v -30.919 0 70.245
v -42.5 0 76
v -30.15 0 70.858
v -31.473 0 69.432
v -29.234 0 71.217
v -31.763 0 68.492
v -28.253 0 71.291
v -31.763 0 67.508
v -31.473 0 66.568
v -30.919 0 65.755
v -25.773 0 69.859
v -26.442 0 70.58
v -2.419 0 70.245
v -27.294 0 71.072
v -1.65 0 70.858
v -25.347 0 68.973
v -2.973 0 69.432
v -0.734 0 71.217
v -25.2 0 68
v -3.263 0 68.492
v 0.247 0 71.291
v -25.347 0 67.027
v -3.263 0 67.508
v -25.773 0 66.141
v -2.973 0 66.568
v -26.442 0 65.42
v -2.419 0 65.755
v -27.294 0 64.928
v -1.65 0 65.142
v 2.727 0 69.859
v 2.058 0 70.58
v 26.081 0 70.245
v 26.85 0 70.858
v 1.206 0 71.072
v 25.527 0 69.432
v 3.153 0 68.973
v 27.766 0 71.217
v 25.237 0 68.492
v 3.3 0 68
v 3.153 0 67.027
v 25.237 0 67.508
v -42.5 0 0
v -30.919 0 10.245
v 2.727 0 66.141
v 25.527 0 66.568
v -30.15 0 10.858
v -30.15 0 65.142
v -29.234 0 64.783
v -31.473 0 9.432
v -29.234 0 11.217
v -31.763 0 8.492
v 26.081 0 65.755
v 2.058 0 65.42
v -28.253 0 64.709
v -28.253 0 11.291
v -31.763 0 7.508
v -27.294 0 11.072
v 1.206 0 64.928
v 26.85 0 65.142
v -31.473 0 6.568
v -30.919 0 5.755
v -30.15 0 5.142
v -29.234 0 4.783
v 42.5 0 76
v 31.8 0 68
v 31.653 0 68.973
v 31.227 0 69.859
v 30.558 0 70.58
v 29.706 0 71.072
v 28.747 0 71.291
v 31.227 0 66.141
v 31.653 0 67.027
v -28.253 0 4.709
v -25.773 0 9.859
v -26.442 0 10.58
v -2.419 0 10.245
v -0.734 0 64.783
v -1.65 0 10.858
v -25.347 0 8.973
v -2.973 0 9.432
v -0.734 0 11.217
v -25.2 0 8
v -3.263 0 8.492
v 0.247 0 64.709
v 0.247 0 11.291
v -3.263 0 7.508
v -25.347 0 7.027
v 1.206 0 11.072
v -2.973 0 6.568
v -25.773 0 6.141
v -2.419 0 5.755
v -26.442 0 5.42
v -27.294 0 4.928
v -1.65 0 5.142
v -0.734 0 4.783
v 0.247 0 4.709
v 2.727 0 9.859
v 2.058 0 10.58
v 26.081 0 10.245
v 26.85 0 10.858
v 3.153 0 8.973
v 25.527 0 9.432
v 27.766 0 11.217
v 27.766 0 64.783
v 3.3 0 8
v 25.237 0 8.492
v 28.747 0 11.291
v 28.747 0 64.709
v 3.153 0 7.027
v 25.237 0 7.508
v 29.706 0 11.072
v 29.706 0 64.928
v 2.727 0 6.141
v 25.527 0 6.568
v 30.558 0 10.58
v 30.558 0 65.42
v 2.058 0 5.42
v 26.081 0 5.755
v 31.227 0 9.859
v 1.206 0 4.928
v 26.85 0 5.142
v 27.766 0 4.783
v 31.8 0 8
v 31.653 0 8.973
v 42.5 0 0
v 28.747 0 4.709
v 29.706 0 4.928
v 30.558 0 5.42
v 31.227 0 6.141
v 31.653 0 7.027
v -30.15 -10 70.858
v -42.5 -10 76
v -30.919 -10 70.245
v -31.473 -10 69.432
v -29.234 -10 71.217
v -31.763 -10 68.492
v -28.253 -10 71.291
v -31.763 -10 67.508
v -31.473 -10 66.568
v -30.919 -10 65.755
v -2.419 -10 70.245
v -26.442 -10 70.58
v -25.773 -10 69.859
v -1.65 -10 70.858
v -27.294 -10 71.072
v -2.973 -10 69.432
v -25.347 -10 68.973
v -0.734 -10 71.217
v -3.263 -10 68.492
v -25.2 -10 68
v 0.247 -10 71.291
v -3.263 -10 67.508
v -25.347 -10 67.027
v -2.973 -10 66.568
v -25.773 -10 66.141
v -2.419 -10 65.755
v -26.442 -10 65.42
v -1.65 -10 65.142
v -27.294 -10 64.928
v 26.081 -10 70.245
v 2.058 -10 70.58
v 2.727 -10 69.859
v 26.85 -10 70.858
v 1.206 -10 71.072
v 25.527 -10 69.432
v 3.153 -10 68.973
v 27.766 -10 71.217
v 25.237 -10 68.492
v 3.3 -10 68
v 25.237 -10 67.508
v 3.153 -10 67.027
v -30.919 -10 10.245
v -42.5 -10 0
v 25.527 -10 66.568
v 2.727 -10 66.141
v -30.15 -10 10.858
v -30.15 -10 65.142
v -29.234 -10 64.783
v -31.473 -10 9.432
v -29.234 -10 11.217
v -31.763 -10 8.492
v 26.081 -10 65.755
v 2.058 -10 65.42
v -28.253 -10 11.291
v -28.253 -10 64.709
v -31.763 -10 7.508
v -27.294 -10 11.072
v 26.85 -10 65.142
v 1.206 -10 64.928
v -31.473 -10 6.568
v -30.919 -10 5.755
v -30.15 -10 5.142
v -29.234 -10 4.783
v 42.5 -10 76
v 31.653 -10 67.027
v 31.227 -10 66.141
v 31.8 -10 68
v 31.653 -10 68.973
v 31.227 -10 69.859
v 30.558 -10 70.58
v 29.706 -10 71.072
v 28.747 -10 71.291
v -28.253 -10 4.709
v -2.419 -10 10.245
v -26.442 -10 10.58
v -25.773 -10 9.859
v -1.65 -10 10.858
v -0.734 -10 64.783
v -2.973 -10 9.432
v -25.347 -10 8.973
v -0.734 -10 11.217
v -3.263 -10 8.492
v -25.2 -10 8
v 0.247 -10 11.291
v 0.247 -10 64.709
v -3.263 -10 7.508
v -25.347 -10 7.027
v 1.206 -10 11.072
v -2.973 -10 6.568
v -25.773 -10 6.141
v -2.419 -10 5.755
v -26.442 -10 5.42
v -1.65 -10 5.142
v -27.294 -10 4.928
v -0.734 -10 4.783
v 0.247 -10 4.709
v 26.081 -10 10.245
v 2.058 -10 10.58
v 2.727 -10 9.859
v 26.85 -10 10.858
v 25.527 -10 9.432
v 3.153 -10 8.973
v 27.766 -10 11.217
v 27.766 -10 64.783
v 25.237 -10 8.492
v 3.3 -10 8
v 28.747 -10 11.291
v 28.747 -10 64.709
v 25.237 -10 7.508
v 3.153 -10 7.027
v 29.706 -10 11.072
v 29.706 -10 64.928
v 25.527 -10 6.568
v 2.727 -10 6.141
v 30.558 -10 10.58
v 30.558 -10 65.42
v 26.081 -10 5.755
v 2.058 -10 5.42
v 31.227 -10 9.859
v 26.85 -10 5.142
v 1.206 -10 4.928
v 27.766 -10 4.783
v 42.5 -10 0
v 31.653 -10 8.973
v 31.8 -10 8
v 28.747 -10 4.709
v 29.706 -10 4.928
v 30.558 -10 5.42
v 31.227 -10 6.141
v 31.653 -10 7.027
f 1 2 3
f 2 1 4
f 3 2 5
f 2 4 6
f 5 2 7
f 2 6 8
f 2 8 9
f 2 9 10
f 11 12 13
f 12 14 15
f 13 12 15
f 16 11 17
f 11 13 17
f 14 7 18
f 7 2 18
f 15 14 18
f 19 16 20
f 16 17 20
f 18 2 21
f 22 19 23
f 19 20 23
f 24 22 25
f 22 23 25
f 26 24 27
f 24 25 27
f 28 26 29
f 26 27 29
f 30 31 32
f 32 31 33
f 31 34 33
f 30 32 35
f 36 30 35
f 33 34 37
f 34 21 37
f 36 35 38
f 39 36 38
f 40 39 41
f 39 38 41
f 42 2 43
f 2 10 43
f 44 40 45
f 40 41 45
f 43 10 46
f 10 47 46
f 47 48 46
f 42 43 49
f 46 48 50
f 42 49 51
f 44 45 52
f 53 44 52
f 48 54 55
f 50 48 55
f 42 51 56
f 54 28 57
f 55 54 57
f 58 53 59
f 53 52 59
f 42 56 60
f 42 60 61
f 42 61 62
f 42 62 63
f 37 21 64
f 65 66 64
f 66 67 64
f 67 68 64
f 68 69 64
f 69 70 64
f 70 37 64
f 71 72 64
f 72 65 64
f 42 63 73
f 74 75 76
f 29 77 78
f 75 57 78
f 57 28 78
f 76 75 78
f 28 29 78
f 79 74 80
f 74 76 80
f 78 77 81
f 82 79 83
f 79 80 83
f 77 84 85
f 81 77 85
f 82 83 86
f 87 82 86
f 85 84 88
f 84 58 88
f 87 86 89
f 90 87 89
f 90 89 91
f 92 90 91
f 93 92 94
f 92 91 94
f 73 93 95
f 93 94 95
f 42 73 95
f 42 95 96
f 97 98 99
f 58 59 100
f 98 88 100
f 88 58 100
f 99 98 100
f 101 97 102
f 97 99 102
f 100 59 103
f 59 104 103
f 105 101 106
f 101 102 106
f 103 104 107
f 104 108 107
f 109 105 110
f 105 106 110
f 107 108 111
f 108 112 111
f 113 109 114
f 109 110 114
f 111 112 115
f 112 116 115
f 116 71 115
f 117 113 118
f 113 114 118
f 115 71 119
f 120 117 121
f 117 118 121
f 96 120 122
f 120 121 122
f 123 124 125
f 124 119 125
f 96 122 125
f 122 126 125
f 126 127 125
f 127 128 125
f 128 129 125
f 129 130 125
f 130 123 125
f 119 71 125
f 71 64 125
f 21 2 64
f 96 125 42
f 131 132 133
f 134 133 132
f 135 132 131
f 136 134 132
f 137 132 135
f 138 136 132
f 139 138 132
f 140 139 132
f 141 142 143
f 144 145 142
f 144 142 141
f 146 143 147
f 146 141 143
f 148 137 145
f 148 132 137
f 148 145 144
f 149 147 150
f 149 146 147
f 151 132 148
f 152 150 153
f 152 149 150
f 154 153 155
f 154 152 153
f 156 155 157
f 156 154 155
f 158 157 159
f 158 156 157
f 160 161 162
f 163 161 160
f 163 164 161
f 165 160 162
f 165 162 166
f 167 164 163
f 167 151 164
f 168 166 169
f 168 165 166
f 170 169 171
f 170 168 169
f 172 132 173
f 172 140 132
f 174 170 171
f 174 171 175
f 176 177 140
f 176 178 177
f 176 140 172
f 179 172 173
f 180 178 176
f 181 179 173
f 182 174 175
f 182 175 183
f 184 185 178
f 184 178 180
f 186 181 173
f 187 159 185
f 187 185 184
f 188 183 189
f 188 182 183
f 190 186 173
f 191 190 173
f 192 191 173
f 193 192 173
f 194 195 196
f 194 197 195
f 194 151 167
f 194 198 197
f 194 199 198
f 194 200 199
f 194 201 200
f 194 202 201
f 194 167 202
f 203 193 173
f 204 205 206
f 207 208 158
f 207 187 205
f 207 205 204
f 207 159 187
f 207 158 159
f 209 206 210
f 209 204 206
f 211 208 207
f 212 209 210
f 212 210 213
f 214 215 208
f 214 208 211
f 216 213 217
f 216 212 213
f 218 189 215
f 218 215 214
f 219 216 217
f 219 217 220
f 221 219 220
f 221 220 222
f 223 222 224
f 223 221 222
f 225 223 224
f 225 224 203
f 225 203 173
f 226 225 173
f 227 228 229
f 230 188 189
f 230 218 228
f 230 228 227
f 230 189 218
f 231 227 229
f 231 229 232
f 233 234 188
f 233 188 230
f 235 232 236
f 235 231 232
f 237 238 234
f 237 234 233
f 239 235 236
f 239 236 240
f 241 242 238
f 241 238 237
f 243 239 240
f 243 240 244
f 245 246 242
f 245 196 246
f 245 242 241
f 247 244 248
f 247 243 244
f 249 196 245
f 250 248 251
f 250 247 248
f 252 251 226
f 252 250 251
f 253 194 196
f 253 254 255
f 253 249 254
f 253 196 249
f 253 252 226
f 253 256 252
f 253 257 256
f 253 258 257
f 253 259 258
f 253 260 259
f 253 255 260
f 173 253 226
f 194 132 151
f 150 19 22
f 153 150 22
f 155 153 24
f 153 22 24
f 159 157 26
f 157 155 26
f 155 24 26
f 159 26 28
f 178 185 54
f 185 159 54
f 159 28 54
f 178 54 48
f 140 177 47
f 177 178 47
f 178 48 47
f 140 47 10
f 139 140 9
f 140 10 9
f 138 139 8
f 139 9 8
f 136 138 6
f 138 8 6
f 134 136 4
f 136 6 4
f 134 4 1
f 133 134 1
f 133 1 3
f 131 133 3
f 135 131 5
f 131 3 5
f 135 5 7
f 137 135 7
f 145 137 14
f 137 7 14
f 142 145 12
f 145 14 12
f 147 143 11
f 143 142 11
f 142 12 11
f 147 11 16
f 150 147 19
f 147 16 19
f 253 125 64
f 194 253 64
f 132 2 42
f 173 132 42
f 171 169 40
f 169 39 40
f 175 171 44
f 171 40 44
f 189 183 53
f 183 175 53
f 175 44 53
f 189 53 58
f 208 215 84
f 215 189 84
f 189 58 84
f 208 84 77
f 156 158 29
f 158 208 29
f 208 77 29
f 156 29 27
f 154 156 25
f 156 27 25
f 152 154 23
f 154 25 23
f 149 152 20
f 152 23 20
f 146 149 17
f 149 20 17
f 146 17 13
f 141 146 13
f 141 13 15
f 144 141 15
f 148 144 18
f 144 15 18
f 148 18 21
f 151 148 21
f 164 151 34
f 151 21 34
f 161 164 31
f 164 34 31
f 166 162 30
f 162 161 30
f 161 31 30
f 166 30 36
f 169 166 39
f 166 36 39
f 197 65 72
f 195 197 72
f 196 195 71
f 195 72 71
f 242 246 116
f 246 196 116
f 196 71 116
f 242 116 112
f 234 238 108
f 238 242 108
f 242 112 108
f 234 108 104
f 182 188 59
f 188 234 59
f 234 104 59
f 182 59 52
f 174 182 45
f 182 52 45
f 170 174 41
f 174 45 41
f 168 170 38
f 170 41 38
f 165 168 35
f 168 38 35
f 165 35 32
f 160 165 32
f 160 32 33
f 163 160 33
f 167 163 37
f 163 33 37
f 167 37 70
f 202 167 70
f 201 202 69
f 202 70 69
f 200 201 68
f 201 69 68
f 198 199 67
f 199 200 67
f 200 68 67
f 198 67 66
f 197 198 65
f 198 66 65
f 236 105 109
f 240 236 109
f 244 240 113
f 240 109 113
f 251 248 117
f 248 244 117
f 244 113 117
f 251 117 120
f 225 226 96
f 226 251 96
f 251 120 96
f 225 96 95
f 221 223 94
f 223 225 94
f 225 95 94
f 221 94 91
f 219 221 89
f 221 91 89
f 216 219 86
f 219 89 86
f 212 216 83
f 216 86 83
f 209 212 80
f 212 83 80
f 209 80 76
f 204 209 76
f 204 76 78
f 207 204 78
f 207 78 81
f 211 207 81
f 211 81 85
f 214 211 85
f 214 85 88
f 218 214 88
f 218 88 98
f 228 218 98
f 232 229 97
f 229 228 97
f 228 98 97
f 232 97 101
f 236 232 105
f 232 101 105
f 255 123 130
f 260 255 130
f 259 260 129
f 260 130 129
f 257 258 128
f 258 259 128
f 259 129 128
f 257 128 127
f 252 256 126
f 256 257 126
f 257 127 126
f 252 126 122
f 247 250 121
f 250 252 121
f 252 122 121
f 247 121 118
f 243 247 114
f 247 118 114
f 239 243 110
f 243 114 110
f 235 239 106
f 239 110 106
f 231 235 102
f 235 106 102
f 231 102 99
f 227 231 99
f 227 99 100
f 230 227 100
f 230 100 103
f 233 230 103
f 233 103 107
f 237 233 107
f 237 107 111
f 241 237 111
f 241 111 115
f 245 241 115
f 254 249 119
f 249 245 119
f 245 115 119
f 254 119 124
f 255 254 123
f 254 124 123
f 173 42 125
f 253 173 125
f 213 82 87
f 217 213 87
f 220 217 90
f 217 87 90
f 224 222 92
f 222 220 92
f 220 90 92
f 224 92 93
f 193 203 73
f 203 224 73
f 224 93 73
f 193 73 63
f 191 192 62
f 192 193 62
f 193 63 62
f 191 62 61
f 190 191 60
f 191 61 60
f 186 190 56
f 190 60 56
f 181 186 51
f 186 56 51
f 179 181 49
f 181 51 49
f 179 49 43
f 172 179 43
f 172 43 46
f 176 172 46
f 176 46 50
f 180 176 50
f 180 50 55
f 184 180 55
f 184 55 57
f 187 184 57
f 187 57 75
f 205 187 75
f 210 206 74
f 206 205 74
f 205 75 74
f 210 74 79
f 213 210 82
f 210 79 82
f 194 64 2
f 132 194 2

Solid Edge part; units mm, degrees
sketch "Sketch1" plane through (0, 0, 0) normal (0, -1, 0) x (1, 0, 0)
  line L0 (-42.5, 0) -> (42.5, 0)
  line L1 (42.5, 0) -> (42.5, 76)
  line L2 (42.5, 76) -> (-42.5, 76)
  line L3 (-42.5, 76) -> (-42.5, 0)
  circle A0 centre (28.5, 68) radius 3.3
  circle A1 centre (0, 68) radius 3.3
  circle A2 centre (-28.5, 68) radius 3.3
  circle A3 centre (28.5, 8) radius 3.3
  circle A4 centre (0, 8) radius 3.3
  circle A5 centre (-28.5, 8) radius 3.3
  dimension "D1" = 85
  dimension "D2" = 14
  dimension "D3" = 6.6
  dimension "D4" = 8
  dimension "D5" = 60
extrude "Protrusion1" add sketch "Sketch1" along normal blind 10
